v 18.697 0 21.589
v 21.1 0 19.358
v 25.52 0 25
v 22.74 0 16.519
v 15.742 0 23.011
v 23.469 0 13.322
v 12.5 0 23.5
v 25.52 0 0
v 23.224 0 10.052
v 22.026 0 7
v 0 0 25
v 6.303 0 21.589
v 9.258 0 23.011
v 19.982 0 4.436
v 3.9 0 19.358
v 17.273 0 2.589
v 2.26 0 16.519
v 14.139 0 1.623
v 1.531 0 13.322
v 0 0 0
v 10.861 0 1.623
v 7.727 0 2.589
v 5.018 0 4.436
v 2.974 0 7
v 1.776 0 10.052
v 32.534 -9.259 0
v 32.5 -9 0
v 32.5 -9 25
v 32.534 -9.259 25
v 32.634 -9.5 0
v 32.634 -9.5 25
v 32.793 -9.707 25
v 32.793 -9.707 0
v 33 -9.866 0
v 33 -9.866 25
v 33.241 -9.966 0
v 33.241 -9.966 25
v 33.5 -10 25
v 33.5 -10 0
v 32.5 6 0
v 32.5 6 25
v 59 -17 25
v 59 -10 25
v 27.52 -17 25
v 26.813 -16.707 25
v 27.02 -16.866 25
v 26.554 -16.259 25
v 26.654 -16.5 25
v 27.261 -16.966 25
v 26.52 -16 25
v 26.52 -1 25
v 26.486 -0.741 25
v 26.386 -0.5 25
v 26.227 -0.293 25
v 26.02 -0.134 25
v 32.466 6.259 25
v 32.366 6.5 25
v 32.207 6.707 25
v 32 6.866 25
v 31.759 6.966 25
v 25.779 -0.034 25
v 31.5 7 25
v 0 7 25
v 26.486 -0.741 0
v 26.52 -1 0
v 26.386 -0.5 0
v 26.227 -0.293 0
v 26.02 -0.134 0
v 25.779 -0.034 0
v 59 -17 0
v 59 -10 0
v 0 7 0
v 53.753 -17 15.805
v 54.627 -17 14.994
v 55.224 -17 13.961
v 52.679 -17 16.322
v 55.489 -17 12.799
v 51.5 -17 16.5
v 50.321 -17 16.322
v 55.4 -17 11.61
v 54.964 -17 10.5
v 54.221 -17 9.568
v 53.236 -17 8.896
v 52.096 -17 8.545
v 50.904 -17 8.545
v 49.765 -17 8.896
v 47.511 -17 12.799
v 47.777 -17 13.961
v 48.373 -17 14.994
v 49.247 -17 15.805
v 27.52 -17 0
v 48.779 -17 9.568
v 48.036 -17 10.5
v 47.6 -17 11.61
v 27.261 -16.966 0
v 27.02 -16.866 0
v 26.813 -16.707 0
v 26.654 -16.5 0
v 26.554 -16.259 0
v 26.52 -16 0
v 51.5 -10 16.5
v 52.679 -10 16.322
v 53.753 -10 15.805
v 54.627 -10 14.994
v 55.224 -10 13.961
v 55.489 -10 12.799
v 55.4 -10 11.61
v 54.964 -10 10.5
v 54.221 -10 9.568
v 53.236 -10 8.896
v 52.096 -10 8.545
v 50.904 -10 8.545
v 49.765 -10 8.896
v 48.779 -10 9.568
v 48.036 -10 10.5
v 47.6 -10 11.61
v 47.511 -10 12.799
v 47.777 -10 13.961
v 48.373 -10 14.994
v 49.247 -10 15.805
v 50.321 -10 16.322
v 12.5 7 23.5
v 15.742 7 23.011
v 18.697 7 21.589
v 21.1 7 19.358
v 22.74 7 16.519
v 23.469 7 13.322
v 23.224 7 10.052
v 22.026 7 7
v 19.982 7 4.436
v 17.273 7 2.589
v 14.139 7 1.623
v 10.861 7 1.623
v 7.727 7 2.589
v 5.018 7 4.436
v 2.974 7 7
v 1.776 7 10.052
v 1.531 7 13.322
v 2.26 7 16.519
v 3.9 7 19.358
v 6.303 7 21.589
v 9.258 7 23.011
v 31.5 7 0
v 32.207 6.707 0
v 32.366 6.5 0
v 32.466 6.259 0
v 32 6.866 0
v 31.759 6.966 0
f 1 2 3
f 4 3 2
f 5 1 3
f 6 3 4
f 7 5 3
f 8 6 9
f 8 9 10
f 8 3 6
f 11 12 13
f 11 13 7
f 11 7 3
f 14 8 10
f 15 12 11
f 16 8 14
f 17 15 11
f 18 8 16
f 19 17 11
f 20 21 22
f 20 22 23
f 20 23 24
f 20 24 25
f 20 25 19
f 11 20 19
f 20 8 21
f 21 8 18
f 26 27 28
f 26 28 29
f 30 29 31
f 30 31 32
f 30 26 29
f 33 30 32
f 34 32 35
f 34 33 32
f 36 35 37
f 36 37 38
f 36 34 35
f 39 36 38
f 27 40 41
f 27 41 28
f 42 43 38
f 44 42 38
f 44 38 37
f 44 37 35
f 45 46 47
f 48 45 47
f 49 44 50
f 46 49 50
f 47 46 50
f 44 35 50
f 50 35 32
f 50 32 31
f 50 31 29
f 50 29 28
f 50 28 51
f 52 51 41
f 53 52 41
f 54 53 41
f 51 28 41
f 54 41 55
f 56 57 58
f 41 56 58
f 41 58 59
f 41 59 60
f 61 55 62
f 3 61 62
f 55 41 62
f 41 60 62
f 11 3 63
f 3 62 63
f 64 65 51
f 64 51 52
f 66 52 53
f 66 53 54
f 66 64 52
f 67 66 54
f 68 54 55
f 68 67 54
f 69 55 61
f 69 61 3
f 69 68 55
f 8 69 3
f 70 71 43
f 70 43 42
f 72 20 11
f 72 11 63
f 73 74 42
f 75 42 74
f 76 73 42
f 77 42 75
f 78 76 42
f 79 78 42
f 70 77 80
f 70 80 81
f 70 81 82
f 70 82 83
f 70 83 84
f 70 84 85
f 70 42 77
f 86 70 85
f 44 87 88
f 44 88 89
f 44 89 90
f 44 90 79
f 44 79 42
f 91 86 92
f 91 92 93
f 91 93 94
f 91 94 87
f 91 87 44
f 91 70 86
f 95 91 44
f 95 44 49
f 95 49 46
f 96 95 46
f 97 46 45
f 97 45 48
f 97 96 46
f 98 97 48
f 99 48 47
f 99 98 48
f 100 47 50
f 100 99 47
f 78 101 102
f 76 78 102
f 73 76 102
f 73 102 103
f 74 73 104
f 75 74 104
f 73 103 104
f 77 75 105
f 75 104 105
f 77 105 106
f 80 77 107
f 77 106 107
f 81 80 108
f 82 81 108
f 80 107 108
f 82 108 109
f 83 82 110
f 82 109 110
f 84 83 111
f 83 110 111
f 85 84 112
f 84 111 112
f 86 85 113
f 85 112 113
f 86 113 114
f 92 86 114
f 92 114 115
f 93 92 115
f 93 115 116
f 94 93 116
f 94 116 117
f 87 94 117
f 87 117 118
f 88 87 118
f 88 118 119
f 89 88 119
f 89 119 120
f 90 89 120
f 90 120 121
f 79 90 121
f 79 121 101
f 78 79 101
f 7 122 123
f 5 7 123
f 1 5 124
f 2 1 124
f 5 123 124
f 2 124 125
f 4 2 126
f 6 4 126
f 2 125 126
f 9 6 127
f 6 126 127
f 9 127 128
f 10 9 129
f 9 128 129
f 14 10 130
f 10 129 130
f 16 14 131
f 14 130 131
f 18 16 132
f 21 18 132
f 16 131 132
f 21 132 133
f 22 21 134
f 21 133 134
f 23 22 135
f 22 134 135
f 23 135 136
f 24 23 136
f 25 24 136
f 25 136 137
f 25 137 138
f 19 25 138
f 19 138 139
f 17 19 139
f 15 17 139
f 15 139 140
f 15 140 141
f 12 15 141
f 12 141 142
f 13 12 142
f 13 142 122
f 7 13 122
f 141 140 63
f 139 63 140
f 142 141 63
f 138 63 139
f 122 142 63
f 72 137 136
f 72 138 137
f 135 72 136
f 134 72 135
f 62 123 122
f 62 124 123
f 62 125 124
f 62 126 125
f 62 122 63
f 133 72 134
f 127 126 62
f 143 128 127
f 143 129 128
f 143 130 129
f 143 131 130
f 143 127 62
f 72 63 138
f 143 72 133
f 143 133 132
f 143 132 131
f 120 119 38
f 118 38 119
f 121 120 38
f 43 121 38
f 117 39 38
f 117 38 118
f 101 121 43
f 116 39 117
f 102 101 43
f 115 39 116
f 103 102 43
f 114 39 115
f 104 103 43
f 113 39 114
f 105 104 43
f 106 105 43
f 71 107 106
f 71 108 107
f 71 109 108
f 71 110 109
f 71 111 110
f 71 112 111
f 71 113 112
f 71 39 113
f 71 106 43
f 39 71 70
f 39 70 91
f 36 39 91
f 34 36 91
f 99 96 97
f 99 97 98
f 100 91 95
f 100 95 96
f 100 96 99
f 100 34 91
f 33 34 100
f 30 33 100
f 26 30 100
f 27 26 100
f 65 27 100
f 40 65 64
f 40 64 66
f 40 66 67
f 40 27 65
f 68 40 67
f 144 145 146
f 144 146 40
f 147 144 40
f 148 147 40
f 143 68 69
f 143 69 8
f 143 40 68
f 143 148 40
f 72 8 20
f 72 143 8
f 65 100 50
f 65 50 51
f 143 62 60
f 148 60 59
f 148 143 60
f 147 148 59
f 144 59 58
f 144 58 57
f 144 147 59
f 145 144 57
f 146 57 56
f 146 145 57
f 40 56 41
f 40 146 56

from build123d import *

# Parameters (mm, degrees)
BOSS_EXTRUDE1_DEPTH = 25
SKETCH3_R           = 11
CUT_EXTRUDE1_DEPTH  = 69.425214496
SKETCH4_R           = 4
CUT_EXTRUDE2_DEPTH  = 67.294871437


with BuildPart() as part:
    # Sketch2 → Boss-Extrude1 (new body)
    with BuildSketch(Plane.XY):
        with BuildLine():
            Line((0, 0), (0, 7))
            Line((0, 7), (31.5, 7))
            ThreePointArc((31.5, 7), (32.207106781, 6.707106781), (32.5, 6))
            Line((32.5, 6), (32.5, -9))
            ThreePointArc((32.5, -9), (32.792893219, -9.707106781), (33.5, -10))
            Line((33.5, -10), (59.000084567, -10))
            Line((59.000084567, -10), (59.000084567, -17))
            Line((59.000084567, -17), (27.520084567, -17))
            ThreePointArc((27.520084567, -17), (26.812977785, -16.707106781), (26.520084567, -16))
            Line((26.520084567, -16), (26.520084567, -1))
            ThreePointArc((26.520084567, -1), (26.227191348, -0.292893219), (25.520084567, 0))
            Line((25.520084567, 0), (0, 0))
        make_face()
    extrude(amount=BOSS_EXTRUDE1_DEPTH)

    # Sketch3 → Cut-Extrude1 (cut, through all)
    with BuildSketch(Plane(origin=(0, 7, 0), x_dir=(1, 0, 0), z_dir=(0, 1, 0))):
        with Locations(Location((12.5, -12.5, 0), (0, 0, 270))):
            Circle(SKETCH3_R)
    extrude(amount=-CUT_EXTRUDE1_DEPTH, mode=Mode.SUBTRACT)

    # Sketch4 → Cut-Extrude2 (cut, through all)
    with BuildSketch(Plane(origin=(0, -10, 0), x_dir=(1, 0, 0), z_dir=(0, 1, 0))):
        with Locations(Location((51.500084567, -12.5, 0), (0, 0, 270))):
            Circle(SKETCH4_R)
    extrude(amount=-CUT_EXTRUDE2_DEPTH, mode=Mode.SUBTRACT)


solid = part.part
